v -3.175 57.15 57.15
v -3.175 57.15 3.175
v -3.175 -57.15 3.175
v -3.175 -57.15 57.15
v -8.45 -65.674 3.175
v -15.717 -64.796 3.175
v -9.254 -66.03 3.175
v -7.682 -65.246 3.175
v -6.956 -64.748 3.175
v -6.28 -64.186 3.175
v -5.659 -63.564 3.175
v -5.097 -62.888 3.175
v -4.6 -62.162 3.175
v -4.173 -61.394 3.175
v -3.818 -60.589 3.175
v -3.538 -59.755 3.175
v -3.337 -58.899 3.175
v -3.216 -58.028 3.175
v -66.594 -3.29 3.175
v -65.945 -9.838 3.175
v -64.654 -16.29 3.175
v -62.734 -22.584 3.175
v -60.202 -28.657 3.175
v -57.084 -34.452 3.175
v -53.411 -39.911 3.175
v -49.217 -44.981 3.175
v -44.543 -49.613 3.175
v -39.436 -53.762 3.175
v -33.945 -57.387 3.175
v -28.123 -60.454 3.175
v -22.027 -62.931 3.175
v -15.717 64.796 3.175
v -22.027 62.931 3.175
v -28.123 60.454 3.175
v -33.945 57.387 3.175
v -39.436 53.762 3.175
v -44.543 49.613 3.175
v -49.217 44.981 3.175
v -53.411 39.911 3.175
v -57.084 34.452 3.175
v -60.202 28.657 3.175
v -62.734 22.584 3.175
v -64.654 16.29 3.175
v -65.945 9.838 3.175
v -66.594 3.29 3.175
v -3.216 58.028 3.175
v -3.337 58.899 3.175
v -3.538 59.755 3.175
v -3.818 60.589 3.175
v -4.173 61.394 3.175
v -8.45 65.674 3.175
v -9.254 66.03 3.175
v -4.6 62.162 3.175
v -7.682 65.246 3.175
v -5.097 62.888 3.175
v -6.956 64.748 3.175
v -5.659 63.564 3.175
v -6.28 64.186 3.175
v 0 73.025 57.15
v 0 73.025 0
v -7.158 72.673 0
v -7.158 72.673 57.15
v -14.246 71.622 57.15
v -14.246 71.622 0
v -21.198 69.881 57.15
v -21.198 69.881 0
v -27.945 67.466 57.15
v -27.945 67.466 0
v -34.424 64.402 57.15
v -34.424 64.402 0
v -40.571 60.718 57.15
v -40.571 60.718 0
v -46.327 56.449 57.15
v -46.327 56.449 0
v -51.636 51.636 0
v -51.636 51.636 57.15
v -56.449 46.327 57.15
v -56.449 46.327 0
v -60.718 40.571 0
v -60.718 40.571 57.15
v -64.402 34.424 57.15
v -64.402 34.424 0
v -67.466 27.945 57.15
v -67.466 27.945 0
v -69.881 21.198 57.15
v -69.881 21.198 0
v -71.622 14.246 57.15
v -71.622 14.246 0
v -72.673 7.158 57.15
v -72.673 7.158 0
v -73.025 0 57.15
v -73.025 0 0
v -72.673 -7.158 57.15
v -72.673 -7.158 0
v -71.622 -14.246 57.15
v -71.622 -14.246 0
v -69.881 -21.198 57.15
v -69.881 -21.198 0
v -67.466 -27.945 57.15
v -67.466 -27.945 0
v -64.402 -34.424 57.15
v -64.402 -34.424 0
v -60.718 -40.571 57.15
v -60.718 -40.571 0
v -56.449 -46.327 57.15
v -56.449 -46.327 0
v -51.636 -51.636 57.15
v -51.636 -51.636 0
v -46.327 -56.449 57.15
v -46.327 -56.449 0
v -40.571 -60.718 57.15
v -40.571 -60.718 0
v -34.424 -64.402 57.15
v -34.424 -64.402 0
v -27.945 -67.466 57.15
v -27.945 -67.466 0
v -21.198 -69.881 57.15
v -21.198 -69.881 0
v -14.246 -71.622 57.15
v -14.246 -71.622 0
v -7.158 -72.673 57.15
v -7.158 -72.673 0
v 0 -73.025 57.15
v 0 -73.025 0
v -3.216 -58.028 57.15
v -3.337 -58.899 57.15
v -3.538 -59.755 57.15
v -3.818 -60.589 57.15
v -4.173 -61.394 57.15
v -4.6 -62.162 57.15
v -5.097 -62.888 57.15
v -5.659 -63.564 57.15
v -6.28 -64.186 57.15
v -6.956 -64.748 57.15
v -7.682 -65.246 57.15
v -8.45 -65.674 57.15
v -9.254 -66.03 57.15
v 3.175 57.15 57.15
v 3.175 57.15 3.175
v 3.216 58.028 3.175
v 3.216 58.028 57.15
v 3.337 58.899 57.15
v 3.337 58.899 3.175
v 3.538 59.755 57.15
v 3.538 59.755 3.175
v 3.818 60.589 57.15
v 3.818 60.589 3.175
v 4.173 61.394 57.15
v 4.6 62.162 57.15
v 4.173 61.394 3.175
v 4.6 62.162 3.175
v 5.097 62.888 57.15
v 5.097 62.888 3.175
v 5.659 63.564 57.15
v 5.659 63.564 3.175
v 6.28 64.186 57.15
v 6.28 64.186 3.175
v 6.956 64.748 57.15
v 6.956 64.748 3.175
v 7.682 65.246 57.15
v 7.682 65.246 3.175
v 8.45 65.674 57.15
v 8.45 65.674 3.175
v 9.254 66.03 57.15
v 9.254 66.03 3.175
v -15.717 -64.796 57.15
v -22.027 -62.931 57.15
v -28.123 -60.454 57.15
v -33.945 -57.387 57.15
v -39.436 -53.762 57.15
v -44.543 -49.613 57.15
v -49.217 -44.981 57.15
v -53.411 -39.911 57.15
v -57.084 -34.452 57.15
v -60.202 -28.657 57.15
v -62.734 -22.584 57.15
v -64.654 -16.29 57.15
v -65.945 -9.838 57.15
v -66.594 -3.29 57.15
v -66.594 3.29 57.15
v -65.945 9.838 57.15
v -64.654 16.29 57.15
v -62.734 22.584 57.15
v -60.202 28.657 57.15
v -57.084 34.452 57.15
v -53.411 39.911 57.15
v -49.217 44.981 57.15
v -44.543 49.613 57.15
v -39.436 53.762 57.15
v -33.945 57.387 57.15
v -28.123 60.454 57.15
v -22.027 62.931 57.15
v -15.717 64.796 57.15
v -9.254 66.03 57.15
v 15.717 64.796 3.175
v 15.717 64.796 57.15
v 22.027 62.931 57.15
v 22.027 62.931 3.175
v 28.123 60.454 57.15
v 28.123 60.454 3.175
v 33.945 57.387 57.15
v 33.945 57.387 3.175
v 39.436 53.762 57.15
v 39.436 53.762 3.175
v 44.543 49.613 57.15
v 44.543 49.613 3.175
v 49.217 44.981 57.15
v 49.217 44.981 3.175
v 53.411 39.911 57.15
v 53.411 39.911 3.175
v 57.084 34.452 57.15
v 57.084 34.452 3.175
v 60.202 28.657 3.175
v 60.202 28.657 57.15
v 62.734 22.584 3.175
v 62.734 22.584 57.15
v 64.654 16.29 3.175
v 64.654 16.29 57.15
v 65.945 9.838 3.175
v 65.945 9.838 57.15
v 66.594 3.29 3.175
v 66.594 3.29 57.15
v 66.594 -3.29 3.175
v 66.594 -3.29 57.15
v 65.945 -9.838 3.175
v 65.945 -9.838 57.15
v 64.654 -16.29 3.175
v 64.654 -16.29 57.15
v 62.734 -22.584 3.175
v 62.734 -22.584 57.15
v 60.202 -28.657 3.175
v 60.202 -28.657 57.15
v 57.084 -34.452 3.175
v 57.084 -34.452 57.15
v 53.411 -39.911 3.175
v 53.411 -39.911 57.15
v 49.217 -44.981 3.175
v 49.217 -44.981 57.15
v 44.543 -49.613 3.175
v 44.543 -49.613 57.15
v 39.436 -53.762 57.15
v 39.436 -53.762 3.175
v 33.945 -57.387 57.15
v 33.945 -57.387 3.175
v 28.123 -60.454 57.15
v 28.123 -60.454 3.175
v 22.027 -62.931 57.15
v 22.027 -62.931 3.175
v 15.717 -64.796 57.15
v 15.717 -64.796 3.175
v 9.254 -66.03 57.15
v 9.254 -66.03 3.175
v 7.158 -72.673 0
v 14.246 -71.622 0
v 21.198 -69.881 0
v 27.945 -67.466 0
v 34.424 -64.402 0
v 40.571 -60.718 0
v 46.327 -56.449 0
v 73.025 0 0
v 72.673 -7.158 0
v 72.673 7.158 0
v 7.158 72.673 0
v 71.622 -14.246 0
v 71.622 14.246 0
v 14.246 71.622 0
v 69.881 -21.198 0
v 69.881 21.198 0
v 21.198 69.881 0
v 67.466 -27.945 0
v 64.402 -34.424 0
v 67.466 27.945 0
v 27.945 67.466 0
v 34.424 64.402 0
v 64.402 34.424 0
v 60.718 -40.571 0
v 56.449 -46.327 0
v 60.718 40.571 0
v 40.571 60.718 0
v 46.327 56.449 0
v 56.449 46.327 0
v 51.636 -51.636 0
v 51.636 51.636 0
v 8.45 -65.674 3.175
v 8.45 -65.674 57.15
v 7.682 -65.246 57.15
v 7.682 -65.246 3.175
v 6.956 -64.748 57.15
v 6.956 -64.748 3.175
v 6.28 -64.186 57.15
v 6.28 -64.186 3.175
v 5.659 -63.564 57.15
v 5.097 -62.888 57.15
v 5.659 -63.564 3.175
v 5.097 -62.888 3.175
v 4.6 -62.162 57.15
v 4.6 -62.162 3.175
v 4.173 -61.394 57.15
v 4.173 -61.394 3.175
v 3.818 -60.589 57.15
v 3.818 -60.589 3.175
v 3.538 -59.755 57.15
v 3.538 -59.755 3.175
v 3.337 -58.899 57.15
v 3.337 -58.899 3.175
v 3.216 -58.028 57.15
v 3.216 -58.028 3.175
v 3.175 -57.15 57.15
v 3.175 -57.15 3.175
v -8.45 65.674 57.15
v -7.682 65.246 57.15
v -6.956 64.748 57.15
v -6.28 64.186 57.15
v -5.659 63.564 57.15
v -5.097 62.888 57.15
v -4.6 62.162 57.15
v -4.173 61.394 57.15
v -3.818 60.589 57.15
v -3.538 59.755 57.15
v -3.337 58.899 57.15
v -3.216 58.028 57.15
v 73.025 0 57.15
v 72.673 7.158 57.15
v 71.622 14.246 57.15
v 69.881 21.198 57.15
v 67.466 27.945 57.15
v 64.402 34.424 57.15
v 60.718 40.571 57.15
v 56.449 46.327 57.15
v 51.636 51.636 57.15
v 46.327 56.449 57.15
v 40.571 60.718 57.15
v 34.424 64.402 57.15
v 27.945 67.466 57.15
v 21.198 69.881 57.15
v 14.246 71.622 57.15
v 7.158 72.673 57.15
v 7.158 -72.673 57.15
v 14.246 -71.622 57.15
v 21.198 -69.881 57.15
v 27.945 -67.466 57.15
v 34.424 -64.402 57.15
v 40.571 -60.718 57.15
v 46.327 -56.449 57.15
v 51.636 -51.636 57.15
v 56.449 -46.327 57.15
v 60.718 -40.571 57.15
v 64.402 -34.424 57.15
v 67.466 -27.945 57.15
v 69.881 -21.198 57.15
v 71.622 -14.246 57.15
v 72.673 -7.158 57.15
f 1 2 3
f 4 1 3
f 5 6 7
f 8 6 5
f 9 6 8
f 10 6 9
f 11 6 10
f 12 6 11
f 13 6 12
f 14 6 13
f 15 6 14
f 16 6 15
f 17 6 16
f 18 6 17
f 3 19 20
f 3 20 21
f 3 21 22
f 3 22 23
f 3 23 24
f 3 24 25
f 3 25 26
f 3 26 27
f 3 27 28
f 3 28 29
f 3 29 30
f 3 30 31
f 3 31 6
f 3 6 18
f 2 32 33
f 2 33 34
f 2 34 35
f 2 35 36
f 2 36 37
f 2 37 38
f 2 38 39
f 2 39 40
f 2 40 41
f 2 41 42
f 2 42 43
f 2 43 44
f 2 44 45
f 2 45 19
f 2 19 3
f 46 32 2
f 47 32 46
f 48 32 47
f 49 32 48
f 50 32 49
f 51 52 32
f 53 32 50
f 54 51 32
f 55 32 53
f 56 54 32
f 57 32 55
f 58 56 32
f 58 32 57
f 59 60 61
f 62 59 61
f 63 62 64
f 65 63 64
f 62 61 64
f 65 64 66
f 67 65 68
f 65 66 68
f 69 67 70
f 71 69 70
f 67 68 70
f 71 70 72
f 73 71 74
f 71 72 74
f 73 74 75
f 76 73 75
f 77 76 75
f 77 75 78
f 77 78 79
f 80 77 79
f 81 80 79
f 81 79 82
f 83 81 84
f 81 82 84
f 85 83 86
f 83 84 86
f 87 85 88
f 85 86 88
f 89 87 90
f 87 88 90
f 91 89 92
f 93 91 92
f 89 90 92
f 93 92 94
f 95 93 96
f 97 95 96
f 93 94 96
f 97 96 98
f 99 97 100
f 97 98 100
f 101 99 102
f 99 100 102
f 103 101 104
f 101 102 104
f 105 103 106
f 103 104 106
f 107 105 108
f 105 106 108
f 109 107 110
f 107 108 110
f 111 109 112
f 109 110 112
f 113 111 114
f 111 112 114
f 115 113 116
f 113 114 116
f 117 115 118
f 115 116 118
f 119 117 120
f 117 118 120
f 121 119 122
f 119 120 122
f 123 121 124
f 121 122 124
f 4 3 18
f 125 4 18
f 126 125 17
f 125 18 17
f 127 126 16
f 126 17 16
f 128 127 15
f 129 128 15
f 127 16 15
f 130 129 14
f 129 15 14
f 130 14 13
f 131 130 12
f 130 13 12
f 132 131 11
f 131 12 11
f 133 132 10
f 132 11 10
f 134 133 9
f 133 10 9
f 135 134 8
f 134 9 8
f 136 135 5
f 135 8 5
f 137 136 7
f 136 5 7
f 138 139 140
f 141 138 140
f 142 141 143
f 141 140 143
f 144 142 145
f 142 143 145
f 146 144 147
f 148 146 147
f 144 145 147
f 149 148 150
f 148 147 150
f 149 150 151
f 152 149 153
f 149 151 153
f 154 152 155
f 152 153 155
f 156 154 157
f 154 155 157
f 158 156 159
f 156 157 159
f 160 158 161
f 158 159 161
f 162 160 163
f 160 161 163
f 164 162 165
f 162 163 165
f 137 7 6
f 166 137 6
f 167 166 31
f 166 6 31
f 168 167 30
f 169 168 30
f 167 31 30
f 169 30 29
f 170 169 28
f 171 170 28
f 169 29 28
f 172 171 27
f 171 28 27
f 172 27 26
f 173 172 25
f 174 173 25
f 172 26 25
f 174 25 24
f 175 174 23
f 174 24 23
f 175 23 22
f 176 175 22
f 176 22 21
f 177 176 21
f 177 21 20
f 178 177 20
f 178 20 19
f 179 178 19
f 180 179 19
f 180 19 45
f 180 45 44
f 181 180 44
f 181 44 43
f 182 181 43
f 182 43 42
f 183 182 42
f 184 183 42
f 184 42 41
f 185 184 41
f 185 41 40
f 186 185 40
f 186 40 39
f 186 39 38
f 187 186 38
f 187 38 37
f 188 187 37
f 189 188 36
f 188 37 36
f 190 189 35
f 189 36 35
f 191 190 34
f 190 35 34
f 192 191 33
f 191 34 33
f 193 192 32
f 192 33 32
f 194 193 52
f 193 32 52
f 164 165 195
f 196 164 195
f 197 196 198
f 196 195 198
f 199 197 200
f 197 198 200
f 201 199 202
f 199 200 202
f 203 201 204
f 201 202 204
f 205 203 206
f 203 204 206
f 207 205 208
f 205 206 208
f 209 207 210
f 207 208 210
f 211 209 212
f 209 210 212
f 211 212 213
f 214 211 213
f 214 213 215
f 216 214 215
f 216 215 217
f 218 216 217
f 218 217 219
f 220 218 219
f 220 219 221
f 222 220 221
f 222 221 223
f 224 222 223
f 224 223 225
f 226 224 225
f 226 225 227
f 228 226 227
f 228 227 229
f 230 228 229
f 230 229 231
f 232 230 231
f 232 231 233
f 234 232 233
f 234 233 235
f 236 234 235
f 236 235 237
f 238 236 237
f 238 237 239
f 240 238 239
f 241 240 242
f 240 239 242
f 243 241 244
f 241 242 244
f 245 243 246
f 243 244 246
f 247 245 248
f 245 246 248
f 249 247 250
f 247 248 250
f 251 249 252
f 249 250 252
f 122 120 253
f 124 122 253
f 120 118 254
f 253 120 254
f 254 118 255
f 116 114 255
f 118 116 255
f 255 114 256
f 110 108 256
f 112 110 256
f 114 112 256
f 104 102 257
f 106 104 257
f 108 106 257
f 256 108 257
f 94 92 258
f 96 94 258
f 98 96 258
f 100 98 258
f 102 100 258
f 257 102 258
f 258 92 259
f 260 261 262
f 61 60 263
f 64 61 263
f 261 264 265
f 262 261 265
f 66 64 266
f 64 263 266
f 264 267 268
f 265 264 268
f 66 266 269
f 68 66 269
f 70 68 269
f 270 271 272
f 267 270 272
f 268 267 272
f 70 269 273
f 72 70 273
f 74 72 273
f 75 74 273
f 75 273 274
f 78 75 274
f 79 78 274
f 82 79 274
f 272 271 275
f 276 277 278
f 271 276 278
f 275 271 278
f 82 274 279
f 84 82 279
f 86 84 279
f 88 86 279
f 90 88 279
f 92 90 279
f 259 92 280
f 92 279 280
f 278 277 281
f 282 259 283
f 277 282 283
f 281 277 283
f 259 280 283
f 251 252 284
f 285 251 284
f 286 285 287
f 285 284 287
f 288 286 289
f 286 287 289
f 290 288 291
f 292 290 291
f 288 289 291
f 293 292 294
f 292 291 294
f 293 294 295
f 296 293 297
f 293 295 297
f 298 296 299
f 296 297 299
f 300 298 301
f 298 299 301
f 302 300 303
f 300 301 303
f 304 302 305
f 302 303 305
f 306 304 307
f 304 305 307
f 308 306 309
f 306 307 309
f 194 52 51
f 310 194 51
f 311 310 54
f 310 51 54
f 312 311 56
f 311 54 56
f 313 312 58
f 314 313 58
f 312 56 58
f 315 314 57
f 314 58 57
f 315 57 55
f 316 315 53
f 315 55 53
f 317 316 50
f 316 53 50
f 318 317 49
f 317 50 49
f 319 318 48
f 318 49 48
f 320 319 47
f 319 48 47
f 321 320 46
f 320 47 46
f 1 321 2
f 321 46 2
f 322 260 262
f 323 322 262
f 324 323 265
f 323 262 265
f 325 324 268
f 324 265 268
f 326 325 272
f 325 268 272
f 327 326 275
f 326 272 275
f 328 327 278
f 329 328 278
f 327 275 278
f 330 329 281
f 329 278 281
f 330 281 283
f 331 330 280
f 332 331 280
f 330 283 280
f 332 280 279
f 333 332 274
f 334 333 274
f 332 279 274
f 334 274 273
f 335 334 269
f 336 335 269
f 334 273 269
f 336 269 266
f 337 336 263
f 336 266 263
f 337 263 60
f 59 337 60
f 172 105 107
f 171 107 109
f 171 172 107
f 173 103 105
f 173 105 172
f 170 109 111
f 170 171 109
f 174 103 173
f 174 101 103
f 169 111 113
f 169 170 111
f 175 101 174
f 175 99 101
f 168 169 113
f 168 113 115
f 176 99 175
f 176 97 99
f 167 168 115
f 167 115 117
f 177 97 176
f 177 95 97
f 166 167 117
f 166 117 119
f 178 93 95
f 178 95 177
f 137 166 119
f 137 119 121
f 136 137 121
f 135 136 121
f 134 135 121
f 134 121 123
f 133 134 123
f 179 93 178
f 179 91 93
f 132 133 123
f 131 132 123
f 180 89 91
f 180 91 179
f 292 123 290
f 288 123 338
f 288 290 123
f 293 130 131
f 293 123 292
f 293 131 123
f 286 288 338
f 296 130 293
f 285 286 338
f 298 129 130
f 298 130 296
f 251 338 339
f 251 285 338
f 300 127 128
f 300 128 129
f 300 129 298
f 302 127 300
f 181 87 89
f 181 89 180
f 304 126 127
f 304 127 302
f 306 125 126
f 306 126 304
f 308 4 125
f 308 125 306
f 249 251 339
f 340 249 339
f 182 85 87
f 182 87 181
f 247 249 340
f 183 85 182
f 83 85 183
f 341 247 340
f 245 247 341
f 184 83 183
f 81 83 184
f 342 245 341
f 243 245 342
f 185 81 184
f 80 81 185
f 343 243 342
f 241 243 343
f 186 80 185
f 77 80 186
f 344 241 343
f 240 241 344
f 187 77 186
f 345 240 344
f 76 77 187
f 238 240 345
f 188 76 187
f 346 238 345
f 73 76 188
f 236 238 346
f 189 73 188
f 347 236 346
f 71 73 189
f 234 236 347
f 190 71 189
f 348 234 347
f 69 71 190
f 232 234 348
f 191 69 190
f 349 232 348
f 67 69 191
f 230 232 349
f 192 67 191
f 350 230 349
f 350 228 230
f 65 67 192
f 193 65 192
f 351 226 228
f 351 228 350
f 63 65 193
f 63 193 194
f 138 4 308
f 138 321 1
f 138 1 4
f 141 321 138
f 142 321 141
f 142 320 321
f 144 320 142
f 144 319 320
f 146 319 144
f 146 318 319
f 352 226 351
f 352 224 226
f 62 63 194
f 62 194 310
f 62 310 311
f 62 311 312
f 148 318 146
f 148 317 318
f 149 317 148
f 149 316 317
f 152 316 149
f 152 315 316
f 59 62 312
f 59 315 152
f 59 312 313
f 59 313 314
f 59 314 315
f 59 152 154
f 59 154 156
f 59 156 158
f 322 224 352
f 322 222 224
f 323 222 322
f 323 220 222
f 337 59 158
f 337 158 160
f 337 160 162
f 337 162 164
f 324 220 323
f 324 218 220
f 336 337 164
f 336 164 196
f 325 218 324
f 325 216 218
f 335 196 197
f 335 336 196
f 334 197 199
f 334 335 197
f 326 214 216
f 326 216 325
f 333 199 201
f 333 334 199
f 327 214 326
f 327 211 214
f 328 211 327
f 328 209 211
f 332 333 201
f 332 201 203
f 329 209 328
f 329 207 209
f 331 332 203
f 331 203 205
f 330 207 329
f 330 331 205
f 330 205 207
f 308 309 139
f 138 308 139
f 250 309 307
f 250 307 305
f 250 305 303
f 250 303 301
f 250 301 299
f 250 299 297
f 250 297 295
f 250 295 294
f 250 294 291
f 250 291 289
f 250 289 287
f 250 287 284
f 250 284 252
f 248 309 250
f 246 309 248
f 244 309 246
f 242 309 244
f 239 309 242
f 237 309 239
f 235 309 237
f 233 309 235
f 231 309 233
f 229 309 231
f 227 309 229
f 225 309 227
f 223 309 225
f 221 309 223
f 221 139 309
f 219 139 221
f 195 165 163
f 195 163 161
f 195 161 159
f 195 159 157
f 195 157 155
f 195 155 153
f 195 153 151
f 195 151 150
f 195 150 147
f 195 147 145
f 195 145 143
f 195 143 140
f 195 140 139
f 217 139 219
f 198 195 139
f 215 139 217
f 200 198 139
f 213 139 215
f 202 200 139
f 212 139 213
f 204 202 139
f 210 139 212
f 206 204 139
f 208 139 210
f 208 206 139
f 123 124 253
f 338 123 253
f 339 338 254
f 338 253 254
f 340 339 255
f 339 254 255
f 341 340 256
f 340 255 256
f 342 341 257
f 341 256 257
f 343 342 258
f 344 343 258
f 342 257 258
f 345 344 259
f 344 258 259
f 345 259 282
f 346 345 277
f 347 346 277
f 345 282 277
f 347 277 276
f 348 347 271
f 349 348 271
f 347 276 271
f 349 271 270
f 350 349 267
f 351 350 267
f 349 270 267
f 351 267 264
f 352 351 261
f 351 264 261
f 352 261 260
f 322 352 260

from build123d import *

# Parameters (mm, degrees)
F1_DEPTH = 57.15
F2_DEPTH = 3.175


# Not quite as in the source:
# - a feature names something its author has since deleted; it is built from what else it names


with BuildPart() as f1:
    # F0 (on Top) → F1 (new body)
    with BuildSketch(Plane.XY):
        with BuildLine():
            ThreePointArc((0, -73.025), (51.6364726961, -51.6364726961), (73.025, 0))
            ThreePointArc((73.025, 0), (51.6364726961, 51.6364726961), (0, 73.025))
            Line((0, 73.025), (0, 66.675))
            ThreePointArc((0, 66.675), (1.5879504187, 66.6560877825), (3.175, 66.5993618588))
            ThreePointArc((3.175, 66.5993618588), (6.220920948, 66.3841529852), (9.2537943589, 66.0297123647))
            ThreePointArc((9.2537943589, 66.0297123647), (50.3117896913, 43.752479279), (66.675, 0))
            ThreePointArc((66.675, 0), (50.3117896913, -43.752479279), (9.2537943589, -66.0297123647))
            ThreePointArc((9.2537943589, -66.0297123647), (6.220920948, -66.3841529852), (3.175, -66.5993618588))
            ThreePointArc((3.175, -66.5993618588), (1.5879504187, -66.6560877825), (0, -66.675))
            Line((0, -66.675), (0, -73.025))
        make_face()
        with BuildLine():
            Line((0, 66.675), (0, 73.025))
            ThreePointArc((0, 73.025), (-73.025, 0), (0, -73.025))
            Line((0, -73.025), (0, -66.675))
            ThreePointArc((0, -66.675), (-1.5879504187, -66.6560877825), (-3.175, -66.5993618588))
            ThreePointArc((-3.175, -66.5993618588), (-6.220920948, -66.3841529852), (-9.2537943589, -66.0297123647))
            ThreePointArc((-9.2537943589, -66.0297123647), (-66.675, 0), (-9.2537943589, 66.0297123647))
            ThreePointArc((-9.2537943589, 66.0297123647), (-6.220920948, 66.3841529852), (-3.175, 66.5993618588))
            ThreePointArc((-3.175, 66.5993618588), (-1.5879504187, 66.6560877825), (0, 66.675))
        make_face()
        with BuildLine():
            Line((-3.175, 57.15), (-3.175, 66.5993618588))
            ThreePointArc((-3.175, 66.5993618588), (-6.220920948, 66.3841529852), (-9.2537943589, 66.0297123647))
            ThreePointArc((-9.2537943589, 66.0297123647), (-4.840269288, 62.5305444087), (-3.175, 57.15))
        make_face()
        with BuildLine():
            ThreePointArc((9.2537943589, 66.0297123647), (6.220920948, 66.3841529852), (3.175, 66.5993618588))
            Line((3.175, 66.5993618588), (3.175, 57.15))
            ThreePointArc((3.175, 57.15), (4.840269288, 62.5305444087), (9.2537943589, 66.0297123647))
        make_face()
        with BuildLine():
            Line((3.175, -57.15), (3.175, -66.5993618588))
            ThreePointArc((3.175, -66.5993618588), (6.220920948, -66.3841529852), (9.2537943589, -66.0297123647))
            ThreePointArc((9.2537943589, -66.0297123647), (4.840269288, -62.5305444087), (3.175, -57.15))
        make_face()
        with BuildLine():
            ThreePointArc((-9.2537943589, -66.0297123647), (-6.220920948, -66.3841529852), (-3.175, -66.5993618588))
            Line((-3.175, -66.5993618588), (-3.175, -57.15))
            ThreePointArc((-3.175, -57.15), (-4.840269288, -62.5305444087), (-9.2537943589, -66.0297123647))
        make_face()
        with BuildLine():
            Line((0, -66.675), (0, 66.675))
            ThreePointArc((0, 66.675), (-1.5879504187, 66.6560877825), (-3.175, 66.5993618588))
            Line((-3.175, 66.5993618588), (-3.175, 57.15))
            Line((-3.175, 57.15), (-3.175, -57.15))
            Line((-3.175, -57.15), (-3.175, -66.5993618588))
            ThreePointArc((-3.175, -66.5993618588), (-1.5879504187, -66.6560877825), (0, -66.675))
        make_face()
        with BuildLine():
            ThreePointArc((3.175, 66.5993618588), (1.5879504187, 66.6560877825), (0, 66.675))
            Line((0, 66.675), (0, -66.675))
            ThreePointArc((0, -66.675), (1.5879504187, -66.6560877825), (3.175, -66.5993618588))
            Line((3.175, -66.5993618588), (3.175, -57.15))
            Line((3.175, -57.15), (3.175, 57.15))
            Line((3.175, 57.15), (3.175, 66.5993618588))
        make_face()
    extrude(amount=F1_DEPTH)

    # F0 (on Top) → F2 (join)
    with BuildSketch(Plane.XY):
        with BuildLine():
            ThreePointArc((-3.175, 57.15), (-4.840269288, 62.5305444087), (-9.2537943589, 66.0297123647))
            ThreePointArc((-9.2537943589, 66.0297123647), (-66.675, 0), (-9.2537943589, -66.0297123647))
            ThreePointArc((-9.2537943589, -66.0297123647), (-4.840269288, -62.5305444087), (-3.175, -57.15))
            Line((-3.175, -57.15), (-3.175, 57.15))
        make_face()
        with BuildLine():
            ThreePointArc((66.675, 0), (50.3117896913, 43.752479279), (9.2537943589, 66.0297123647))
            ThreePointArc((9.2537943589, 66.0297123647), (4.840269288, 62.5305444087), (3.175, 57.15))
            Line((3.175, 57.15), (3.175, -57.15))
            ThreePointArc((3.175, -57.15), (4.840269288, -62.5305444087), (9.2537943589, -66.0297123647))
            ThreePointArc((9.2537943589, -66.0297123647), (50.3117896913, -43.752479279), (66.675, 0))
        make_face()
    extrude(amount=F2_DEPTH)


solid = f1.part
